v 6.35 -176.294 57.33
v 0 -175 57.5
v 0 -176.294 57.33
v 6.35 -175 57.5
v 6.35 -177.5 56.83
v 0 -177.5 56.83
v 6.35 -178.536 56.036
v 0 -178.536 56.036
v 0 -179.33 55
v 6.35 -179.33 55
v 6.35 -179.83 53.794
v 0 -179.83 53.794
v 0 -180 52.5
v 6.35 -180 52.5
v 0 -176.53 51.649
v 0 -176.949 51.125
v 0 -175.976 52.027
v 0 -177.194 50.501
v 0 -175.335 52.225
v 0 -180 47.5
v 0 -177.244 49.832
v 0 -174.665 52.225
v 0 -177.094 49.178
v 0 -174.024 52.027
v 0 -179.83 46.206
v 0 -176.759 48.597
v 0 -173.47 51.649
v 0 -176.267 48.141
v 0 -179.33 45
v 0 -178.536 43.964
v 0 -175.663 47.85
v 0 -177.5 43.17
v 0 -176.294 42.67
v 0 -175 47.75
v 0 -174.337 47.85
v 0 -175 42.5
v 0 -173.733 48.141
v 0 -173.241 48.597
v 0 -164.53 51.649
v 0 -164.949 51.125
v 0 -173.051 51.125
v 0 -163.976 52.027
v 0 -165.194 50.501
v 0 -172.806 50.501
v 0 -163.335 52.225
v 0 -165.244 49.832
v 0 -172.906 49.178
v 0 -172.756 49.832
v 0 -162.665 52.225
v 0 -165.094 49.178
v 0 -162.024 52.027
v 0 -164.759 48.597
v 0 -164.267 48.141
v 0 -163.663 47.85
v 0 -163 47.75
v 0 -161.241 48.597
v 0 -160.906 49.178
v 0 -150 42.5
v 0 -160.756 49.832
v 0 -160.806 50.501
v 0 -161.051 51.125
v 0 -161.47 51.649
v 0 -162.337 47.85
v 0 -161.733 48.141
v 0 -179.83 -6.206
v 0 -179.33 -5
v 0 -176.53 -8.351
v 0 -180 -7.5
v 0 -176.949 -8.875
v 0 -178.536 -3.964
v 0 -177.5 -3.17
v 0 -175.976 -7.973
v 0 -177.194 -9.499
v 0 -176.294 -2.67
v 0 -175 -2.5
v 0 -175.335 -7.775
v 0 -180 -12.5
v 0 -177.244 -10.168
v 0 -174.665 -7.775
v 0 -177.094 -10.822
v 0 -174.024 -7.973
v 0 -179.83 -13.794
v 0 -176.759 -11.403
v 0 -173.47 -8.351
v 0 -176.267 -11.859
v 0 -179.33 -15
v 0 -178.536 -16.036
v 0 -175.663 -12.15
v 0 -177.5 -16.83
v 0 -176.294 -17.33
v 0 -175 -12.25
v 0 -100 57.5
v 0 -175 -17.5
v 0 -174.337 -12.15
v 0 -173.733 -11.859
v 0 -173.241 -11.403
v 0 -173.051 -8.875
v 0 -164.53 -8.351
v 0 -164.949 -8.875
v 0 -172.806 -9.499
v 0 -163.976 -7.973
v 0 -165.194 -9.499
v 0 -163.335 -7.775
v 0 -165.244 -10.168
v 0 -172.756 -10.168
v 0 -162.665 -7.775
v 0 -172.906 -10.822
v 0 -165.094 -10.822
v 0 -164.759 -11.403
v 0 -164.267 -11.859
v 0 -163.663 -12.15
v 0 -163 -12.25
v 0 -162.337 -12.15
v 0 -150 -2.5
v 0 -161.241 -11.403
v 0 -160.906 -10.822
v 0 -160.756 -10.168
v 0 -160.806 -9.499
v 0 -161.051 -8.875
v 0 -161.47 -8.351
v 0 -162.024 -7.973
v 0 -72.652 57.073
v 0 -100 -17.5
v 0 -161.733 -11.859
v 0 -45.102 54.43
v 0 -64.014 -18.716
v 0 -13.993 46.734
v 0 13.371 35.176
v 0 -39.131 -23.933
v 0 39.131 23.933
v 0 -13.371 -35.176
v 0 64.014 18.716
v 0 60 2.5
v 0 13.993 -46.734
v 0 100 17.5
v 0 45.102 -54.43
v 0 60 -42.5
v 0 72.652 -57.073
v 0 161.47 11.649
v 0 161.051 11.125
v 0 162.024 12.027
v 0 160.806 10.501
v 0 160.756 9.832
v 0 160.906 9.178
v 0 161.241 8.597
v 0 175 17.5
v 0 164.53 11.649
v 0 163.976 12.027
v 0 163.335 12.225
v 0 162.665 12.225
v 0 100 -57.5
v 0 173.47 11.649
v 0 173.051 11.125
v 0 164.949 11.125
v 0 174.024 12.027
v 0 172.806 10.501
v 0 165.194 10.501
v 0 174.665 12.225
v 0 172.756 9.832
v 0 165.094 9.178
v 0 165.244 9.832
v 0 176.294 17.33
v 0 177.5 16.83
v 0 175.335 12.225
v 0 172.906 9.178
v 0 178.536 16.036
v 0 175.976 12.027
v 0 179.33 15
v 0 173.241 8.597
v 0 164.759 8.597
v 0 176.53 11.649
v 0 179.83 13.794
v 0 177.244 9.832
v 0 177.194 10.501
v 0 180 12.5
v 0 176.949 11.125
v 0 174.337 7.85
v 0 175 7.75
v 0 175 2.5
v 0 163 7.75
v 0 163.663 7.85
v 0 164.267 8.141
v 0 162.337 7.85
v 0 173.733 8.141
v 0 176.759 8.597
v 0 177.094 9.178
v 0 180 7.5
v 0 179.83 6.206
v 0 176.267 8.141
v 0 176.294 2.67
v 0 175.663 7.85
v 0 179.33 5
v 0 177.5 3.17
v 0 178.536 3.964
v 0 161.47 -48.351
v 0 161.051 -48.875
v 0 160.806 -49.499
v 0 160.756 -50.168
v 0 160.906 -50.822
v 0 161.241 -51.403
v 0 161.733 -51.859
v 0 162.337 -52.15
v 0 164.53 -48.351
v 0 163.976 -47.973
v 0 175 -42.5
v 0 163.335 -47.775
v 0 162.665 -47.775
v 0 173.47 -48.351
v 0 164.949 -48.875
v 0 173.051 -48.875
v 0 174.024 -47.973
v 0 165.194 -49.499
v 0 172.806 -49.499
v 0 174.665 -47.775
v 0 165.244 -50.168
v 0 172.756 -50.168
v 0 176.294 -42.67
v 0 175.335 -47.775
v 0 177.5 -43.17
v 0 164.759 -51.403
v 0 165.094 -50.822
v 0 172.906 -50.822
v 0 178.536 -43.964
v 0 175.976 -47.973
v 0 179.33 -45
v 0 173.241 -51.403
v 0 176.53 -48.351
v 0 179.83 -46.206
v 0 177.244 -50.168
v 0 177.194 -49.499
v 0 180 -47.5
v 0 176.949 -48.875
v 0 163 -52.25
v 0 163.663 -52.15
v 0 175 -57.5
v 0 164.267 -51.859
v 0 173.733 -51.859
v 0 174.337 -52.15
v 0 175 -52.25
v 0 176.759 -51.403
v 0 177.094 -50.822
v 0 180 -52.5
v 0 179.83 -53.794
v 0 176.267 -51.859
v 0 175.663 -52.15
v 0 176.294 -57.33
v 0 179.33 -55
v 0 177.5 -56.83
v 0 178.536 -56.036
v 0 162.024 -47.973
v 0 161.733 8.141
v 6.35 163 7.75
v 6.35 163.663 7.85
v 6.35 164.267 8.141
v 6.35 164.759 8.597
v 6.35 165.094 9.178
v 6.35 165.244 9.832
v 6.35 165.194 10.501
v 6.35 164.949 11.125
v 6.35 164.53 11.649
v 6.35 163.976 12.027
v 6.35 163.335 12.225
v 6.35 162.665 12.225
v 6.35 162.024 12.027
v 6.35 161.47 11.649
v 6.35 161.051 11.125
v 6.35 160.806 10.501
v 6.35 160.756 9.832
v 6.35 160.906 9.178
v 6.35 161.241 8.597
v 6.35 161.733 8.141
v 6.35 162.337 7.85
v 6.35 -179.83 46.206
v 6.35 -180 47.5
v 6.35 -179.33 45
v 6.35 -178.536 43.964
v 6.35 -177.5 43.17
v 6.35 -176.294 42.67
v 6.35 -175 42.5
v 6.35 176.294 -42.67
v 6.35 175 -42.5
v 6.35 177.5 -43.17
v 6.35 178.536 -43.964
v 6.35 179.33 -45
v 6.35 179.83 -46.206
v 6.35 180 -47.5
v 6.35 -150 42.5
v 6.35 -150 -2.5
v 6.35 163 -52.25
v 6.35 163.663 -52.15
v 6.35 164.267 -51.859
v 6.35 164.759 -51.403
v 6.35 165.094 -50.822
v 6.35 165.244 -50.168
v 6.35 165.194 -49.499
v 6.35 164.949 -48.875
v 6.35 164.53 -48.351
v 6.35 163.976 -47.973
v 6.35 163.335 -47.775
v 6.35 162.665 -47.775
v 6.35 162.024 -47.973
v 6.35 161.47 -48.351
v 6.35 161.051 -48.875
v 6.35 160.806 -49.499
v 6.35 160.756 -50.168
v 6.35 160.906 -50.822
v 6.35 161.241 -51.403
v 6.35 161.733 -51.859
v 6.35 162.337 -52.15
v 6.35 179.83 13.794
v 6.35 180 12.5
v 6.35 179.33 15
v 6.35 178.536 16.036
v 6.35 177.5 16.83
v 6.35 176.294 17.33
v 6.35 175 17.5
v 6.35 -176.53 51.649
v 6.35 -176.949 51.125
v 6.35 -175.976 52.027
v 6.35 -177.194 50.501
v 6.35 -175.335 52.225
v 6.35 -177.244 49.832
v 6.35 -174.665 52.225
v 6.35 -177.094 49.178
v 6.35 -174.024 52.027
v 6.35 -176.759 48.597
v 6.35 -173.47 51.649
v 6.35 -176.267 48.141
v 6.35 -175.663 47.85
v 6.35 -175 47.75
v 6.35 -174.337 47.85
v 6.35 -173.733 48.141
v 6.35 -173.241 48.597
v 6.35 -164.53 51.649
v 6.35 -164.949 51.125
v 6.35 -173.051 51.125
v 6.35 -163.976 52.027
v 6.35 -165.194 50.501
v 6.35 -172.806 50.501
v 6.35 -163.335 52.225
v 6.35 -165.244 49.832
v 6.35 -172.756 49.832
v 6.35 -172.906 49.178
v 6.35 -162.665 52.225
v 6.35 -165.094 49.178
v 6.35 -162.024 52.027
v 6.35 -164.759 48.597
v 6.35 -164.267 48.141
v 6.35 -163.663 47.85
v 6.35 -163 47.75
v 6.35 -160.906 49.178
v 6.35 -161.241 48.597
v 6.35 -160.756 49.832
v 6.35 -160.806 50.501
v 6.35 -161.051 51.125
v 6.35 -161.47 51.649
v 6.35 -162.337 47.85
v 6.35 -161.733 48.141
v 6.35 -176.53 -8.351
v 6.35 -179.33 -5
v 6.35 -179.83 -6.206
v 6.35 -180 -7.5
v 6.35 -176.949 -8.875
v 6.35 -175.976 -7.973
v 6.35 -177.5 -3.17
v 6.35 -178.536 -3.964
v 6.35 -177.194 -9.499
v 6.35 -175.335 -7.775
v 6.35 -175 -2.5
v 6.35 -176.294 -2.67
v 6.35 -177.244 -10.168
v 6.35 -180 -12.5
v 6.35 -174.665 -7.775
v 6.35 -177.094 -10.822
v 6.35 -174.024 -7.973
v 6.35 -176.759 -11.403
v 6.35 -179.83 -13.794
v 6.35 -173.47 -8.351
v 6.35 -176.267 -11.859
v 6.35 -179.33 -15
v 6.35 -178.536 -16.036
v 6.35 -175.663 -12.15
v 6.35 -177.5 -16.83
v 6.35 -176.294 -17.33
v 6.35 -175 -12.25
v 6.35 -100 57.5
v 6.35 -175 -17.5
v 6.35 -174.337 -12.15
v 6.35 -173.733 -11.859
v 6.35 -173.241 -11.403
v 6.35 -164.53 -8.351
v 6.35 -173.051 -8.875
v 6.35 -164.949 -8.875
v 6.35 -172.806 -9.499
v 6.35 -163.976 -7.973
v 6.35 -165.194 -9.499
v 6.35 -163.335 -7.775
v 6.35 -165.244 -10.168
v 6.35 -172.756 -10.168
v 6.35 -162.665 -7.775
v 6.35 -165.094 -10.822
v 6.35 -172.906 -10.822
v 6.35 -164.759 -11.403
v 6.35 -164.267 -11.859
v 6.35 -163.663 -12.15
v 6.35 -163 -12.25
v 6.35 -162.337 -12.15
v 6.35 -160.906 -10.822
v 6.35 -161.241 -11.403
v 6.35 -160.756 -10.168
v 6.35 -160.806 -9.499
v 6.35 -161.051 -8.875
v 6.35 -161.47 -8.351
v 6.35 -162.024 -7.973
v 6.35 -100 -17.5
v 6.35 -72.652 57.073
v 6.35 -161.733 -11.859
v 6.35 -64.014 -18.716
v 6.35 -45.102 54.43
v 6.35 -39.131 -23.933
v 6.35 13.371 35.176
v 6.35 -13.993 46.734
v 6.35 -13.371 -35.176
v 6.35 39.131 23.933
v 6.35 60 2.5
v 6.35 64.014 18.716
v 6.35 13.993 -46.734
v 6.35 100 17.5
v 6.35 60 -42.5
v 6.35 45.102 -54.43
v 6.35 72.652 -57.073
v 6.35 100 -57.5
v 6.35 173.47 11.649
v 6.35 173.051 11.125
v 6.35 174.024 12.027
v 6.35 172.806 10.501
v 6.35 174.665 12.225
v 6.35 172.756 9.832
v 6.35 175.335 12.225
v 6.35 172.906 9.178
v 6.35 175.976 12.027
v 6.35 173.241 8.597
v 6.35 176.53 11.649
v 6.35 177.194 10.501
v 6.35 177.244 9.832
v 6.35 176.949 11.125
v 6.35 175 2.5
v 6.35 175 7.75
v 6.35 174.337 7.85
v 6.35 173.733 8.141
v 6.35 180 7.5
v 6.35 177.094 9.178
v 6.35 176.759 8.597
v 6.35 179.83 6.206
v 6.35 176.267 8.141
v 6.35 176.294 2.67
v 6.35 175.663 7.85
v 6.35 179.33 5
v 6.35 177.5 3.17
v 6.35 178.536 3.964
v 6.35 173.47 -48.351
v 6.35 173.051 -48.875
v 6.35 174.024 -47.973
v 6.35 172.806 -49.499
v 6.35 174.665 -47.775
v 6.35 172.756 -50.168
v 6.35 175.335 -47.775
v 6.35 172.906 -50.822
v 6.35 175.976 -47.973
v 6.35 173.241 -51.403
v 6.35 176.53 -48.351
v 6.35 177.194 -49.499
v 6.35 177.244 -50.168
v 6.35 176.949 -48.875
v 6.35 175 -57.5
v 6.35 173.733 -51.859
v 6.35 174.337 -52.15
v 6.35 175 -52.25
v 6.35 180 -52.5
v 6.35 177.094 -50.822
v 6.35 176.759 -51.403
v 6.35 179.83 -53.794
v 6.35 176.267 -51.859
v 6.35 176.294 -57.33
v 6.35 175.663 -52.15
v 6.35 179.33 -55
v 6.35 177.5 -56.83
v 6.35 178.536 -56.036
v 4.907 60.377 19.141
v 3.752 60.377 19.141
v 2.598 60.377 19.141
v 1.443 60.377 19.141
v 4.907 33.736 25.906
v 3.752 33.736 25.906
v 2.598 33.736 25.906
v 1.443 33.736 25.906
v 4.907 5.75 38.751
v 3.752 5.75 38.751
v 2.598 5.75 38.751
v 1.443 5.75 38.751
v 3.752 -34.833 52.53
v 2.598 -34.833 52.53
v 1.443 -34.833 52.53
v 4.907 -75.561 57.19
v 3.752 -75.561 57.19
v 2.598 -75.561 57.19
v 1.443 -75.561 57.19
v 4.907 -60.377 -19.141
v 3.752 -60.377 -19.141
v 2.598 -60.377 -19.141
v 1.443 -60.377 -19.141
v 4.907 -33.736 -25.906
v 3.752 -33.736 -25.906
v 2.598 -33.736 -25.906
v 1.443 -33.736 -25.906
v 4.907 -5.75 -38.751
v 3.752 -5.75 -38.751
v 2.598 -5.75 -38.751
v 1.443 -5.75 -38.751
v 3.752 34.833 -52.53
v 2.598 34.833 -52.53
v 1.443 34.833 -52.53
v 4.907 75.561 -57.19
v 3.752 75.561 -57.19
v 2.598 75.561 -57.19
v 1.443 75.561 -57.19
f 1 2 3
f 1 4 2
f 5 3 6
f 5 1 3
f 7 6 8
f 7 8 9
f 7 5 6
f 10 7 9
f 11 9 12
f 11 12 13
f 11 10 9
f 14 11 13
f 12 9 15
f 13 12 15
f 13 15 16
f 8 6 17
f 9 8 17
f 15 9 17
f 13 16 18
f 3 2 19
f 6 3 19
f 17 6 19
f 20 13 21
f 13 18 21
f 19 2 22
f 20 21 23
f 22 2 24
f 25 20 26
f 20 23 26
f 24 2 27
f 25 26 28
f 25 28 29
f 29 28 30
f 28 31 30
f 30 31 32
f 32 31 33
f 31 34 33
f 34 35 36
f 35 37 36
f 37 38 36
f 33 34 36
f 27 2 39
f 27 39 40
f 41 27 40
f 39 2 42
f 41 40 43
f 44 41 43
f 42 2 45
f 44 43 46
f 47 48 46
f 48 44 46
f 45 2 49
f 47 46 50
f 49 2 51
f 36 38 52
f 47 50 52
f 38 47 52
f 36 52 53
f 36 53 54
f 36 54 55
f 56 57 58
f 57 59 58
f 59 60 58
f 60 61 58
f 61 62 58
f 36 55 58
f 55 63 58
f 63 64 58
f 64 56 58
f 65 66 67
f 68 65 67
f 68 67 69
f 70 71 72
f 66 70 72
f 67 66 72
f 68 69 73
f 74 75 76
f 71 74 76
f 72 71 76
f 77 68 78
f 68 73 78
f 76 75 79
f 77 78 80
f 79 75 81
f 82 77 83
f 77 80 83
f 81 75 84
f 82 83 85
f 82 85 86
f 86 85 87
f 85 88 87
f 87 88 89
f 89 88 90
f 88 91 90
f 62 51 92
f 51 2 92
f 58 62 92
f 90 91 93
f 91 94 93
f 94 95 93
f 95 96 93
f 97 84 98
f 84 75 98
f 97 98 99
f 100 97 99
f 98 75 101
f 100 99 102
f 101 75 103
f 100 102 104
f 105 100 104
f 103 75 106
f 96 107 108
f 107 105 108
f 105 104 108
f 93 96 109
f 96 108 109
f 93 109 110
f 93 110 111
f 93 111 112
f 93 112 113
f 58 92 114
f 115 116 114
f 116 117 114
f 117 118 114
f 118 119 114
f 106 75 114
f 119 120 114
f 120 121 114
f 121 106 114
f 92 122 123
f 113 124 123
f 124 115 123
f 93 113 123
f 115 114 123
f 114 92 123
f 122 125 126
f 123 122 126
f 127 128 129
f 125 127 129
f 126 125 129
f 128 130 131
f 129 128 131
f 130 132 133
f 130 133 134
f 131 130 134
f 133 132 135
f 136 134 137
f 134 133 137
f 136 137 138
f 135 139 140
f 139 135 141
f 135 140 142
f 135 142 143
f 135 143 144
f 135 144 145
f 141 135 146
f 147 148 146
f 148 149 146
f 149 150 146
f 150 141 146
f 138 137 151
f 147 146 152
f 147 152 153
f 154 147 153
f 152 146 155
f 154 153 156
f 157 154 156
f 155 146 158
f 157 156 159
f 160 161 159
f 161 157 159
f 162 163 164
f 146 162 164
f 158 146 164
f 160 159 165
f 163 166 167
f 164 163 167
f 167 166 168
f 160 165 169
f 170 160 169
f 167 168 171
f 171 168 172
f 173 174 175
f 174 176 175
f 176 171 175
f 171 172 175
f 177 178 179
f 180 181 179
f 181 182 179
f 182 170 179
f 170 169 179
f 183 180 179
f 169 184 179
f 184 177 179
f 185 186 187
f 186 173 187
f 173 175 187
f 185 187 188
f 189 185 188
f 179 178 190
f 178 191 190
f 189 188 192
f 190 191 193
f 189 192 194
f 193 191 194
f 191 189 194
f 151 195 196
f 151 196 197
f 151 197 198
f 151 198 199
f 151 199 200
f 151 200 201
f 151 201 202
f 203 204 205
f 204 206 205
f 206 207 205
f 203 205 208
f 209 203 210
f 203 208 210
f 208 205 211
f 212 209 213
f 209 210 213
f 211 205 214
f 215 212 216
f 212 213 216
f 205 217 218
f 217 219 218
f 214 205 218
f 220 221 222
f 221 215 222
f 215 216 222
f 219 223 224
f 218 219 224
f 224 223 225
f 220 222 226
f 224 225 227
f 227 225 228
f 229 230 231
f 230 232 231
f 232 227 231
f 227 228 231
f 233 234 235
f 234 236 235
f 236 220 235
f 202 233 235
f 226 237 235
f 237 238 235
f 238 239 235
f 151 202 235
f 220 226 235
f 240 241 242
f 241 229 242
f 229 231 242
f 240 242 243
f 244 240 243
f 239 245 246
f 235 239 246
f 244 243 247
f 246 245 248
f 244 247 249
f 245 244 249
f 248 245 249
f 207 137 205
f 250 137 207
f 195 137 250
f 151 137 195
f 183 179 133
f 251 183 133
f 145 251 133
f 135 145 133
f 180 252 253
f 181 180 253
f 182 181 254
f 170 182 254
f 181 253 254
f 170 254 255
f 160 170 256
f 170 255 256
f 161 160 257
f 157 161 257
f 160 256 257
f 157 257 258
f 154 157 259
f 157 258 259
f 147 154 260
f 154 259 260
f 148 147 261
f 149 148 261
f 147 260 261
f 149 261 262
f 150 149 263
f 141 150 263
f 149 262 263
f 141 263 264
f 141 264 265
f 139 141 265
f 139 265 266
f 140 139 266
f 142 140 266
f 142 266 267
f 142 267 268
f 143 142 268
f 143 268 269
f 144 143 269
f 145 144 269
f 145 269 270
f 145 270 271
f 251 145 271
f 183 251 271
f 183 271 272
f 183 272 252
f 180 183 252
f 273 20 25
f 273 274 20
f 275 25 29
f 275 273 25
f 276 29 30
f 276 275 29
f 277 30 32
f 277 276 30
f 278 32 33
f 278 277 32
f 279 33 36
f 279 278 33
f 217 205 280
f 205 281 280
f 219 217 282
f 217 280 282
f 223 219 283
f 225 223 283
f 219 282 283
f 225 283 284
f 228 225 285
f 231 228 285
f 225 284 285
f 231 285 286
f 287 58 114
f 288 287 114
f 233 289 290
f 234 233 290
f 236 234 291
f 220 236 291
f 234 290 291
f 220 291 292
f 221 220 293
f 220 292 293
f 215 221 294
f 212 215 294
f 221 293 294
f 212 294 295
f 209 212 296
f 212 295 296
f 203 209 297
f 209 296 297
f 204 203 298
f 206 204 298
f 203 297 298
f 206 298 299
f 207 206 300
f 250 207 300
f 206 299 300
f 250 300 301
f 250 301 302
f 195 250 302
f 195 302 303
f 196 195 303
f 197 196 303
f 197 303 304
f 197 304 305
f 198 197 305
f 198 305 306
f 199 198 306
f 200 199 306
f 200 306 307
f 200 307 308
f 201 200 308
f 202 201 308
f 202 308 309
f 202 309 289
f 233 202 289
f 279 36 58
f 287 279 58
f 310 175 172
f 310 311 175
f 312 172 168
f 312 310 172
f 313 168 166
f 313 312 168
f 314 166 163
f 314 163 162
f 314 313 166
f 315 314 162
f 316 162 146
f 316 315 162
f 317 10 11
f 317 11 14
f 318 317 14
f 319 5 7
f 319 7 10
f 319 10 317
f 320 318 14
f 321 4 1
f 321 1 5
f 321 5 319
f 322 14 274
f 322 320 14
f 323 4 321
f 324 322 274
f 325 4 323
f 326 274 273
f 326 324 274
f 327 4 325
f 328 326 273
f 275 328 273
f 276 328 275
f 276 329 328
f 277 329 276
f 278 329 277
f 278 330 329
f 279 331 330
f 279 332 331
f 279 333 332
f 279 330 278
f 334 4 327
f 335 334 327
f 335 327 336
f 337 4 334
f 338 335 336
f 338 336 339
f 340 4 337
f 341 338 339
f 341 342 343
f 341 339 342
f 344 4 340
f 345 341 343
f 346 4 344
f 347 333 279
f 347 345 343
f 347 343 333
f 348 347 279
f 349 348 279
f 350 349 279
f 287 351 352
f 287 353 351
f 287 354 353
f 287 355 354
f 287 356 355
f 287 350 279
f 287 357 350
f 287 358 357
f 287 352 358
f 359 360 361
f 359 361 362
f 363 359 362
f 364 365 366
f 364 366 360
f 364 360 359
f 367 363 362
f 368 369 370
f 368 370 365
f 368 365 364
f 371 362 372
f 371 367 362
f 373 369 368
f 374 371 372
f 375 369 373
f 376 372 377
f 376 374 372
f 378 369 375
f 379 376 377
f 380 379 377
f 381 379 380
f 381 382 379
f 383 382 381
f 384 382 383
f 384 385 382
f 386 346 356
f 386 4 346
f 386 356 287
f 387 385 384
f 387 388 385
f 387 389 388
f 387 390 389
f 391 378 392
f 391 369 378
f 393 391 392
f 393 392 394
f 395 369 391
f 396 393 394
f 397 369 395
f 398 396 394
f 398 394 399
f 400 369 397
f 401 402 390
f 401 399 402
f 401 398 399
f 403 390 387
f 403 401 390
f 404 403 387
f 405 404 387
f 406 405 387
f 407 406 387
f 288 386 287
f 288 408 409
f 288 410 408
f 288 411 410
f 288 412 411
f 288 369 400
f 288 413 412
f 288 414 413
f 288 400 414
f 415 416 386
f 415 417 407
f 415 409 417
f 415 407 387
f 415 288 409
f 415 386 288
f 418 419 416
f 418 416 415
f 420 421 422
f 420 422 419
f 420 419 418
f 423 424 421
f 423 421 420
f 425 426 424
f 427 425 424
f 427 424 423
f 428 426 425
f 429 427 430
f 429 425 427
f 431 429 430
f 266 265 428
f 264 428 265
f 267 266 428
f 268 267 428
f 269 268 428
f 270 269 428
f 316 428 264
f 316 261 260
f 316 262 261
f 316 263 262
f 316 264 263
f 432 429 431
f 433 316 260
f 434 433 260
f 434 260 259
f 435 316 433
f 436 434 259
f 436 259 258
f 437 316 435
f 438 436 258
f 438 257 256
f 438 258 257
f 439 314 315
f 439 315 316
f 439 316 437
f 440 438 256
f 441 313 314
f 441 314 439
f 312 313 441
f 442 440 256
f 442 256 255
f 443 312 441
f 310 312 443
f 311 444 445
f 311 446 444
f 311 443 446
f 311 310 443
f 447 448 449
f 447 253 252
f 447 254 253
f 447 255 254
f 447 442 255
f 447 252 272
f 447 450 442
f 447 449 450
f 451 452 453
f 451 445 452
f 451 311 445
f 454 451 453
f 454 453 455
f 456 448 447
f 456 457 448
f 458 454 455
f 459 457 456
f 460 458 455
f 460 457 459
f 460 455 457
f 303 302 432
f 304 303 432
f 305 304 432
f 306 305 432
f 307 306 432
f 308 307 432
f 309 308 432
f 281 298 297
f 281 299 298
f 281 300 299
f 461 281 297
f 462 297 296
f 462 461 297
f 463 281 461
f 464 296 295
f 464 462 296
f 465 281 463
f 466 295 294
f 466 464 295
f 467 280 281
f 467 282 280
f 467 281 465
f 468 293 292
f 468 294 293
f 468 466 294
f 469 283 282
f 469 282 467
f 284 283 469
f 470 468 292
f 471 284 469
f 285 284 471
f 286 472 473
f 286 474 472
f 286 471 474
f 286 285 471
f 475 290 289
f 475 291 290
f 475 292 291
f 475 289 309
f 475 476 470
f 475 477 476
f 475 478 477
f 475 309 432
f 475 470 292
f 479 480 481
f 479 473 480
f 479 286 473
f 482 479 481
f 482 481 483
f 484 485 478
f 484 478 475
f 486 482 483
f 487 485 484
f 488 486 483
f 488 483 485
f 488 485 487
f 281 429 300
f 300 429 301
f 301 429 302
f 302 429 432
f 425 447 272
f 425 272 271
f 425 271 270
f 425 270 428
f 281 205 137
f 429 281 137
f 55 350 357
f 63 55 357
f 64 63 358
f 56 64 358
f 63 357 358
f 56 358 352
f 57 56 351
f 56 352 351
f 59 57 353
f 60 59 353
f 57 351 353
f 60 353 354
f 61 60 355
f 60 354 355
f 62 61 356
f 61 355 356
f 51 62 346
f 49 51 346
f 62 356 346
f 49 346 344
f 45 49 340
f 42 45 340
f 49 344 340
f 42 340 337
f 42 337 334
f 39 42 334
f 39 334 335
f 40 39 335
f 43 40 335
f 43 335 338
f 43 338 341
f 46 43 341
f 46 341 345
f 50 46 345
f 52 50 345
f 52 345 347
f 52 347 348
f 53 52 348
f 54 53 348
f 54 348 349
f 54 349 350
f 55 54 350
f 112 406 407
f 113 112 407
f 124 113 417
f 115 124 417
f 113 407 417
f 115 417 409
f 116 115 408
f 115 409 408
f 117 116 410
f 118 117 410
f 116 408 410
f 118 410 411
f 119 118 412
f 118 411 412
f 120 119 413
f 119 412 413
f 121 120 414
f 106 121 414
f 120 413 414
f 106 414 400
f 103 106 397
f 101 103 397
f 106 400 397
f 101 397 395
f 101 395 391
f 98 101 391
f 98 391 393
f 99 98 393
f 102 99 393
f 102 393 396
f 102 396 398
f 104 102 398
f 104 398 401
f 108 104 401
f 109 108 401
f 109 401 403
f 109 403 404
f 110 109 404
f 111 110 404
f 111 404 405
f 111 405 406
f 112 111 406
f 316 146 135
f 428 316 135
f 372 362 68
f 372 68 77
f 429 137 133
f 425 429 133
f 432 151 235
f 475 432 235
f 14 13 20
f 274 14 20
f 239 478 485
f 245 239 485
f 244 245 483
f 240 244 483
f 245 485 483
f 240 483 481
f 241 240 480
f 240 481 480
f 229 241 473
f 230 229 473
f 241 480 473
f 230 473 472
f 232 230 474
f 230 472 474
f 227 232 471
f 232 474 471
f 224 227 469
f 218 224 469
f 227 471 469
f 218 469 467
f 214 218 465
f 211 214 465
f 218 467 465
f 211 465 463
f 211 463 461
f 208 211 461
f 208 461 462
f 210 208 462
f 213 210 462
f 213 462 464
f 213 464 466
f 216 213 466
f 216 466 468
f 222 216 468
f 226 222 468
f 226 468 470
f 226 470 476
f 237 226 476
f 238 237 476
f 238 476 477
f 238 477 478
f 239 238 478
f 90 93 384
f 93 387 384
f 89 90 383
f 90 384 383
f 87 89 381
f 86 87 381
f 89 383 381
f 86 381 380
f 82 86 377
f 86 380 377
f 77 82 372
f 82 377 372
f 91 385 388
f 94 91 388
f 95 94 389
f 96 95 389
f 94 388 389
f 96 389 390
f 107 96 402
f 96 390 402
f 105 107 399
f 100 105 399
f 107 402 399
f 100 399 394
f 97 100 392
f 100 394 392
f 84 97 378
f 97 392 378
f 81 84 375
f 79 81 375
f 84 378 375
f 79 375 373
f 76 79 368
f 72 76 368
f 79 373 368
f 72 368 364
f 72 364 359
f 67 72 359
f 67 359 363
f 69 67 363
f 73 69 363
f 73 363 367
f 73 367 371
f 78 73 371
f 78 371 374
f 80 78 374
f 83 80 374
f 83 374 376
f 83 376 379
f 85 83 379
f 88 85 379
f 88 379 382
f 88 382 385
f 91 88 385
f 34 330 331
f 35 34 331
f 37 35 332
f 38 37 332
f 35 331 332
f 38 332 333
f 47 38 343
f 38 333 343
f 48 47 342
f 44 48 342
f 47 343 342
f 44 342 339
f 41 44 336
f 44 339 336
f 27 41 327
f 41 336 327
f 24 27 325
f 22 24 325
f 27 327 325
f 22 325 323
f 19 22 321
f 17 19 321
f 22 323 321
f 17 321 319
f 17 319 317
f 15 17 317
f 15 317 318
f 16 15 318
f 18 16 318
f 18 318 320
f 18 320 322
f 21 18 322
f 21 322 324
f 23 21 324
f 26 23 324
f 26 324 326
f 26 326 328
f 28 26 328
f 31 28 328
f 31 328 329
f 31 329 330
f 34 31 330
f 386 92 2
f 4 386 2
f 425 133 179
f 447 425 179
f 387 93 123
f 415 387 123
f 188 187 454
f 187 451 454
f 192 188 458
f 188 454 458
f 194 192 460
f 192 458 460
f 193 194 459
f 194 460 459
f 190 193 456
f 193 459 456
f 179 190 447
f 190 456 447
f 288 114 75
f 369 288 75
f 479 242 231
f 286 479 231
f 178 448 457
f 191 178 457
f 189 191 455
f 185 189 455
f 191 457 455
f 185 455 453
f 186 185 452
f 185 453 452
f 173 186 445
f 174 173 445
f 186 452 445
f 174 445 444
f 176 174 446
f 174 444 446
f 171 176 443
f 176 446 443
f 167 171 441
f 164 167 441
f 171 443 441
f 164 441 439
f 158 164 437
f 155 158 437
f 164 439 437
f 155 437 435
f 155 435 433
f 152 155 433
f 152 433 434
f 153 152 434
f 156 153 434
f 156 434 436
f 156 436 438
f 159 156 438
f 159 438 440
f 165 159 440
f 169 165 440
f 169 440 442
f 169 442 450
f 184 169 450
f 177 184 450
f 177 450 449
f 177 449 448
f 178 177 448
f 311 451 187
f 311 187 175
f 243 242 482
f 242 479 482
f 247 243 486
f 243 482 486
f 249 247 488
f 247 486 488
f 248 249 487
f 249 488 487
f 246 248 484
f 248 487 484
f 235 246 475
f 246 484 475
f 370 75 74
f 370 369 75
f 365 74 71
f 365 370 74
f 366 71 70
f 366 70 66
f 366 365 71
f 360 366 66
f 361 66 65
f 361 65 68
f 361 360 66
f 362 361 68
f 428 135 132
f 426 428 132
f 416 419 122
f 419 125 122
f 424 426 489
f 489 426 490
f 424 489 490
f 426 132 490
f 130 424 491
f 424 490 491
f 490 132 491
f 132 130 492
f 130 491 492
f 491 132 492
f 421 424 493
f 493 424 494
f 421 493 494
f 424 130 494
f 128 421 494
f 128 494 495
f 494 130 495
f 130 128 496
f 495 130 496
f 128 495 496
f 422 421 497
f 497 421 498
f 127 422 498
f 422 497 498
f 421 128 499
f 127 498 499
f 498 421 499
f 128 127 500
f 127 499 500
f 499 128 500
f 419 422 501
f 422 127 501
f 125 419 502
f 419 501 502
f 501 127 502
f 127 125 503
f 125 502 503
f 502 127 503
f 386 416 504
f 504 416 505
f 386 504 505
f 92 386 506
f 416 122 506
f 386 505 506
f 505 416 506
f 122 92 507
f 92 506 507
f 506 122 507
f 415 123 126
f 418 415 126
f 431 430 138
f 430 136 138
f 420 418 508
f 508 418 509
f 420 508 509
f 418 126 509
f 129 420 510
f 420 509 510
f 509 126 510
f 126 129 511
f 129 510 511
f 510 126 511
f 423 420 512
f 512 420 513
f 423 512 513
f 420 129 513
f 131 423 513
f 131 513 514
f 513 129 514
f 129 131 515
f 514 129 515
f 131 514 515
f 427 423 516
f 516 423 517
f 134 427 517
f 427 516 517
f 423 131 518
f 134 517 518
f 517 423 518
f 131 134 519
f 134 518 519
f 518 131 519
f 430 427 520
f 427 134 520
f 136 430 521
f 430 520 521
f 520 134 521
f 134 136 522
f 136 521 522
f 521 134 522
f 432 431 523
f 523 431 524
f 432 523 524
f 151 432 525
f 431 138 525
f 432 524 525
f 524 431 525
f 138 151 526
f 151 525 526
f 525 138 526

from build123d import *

# Parameters (mm, degrees)
SALIENTE_EXTRUIR1_DEPTH      = 6.35
TALADRO_DE_MARGEN_PARA_M41_D = 4.5
REDONDEO1_R                  = 5


# Read off the part's stored shape, not the designer's step: Saliente-Extruir1
with BuildPart() as part:
    # Saliente-Extruir1 outline → Saliente-Extruir1 (new body)
    with BuildSketch(Plane(origin=(0, 0, 0), x_dir=(0, 0, -1), z_dir=(1, 0, 0))):
        with BuildLine():
            Line((-2.5, 180), (-17.5, 180))
            Line((-17.5, 180), (-17.5, 100))
            add(Edge.make_bspline(
                [(-17.5, 100), (-17.5, 98.712751966), (-17.500047788, 96.116321069), (-17.51148981, 91.098940131), (-17.565479393, 85.046877218), (-17.737925717, 78.203948852), (-18.147729277, 69.656133307), (-19.038911227, 60.095322328), (-20.718334539, 50.310614009), (-22.956153632, 41.771686415), (-25.785586207, 33.773608765), (-29.338865081, 25.548124026), (-33.697565336, 16.449967912), (-38.713561507, 6.016494532), (-43.953609584, -6.016361906), (-48.809754323, -19.661313126), (-52.733015331, -34.671033487), (-55.439087369, -50.654463146), (-56.694005293, -64.452671708), (-57.222054598, -75.565918854), (-57.428472519, -83.87427142), (-57.487938926, -90.701655992), (-57.499988878, -96.070691027), (-57.5, -98.684323127), (-57.5, -100)],
                knots=[0, 0, 0, 0, 0.015625, 0.03125, 0.0625, 0.09375, 0.125, 0.1875, 0.25, 0.3125, 0.375, 0.4375, 0.5, 0.5625, 0.625, 0.6875, 0.75, 0.8125, 0.875, 0.90625, 0.9375, 0.96875, 0.984375, 1, 1, 1, 1], degree=3))
            Line((-57.5, -100), (-57.5, -180))
            Line((-57.5, -180), (-42.5, -180))
            Line((-42.5, -180), (-42.5, -150))
            Line((-42.5, -150), (2.5, -150))
            Line((2.5, -150), (2.5, -180))
            Line((2.5, -180), (17.5, -180))
            Line((17.5, -180), (17.5, -100))
            add(Edge.make_bspline(
                [(17.5, -100), (17.5, -98.712751966), (17.500047788, -96.116321069), (17.51148981, -91.098940131), (17.565479393, -85.046877218), (17.737925717, -78.203948852), (18.147729277, -69.656133307), (19.038911227, -60.095322328), (20.718334539, -50.310614009), (22.956153632, -41.771686415), (25.785586207, -33.773608765), (29.338865081, -25.548124026), (33.697565336, -16.449967912), (38.713561507, -6.016494532), (43.953609584, 6.016361906), (48.809754323, 19.661313126), (52.733015331, 34.671033487), (55.439087369, 50.654463146), (56.694005293, 64.452671708), (57.222054598, 75.565918854), (57.428472519, 83.87427142), (57.487938926, 90.701655992), (57.499988878, 96.070691027), (57.5, 98.684323127), (57.5, 100)],
                knots=[0, 0, 0, 0, 0.015625, 0.03125, 0.0625, 0.09375, 0.125, 0.1875, 0.25, 0.3125, 0.375, 0.4375, 0.5, 0.5625, 0.625, 0.6875, 0.75, 0.8125, 0.875, 0.90625, 0.9375, 0.96875, 0.984375, 1, 1, 1, 1], degree=3))
            Line((57.5, 100), (57.5, 180))
            Line((57.5, 180), (42.5, 180))
            Line((42.5, 180), (42.5, 60))
            Line((42.5, 60), (-2.5, 60))
            Line((-2.5, 60), (-2.5, 180))
        make_face()
    extrude(amount=SALIENTE_EXTRUIR1_DEPTH)

    # Taladro de margen para M41 (through all)
    with Locations(Plane.ZY):
        with Locations((10, 163), (10, 175), (-50, 163), (-50, 175), (50, -175), (50, -163), (-10, -175), (-10, -163)):
            Hole(TALADRO_DE_MARGEN_PARA_M41_D / 2)

    # Redondeo1
    redondeo1_edges = [part.edges().sort_by_distance(p)[0] for p in [
        (3.175, 180, 2.5),
        (3.175, 180, -42.5),
        (3.175, 180, -57.5),
        (3.175, -180, -17.5),
        (3.175, -180, -2.5),
        (3.175, -180, 42.5),
        (3.175, -180, 57.5),
        (3.175, 180, 17.5),
    ]]
    fillet(redondeo1_edges, radius=REDONDEO1_R)


solid = part.part
